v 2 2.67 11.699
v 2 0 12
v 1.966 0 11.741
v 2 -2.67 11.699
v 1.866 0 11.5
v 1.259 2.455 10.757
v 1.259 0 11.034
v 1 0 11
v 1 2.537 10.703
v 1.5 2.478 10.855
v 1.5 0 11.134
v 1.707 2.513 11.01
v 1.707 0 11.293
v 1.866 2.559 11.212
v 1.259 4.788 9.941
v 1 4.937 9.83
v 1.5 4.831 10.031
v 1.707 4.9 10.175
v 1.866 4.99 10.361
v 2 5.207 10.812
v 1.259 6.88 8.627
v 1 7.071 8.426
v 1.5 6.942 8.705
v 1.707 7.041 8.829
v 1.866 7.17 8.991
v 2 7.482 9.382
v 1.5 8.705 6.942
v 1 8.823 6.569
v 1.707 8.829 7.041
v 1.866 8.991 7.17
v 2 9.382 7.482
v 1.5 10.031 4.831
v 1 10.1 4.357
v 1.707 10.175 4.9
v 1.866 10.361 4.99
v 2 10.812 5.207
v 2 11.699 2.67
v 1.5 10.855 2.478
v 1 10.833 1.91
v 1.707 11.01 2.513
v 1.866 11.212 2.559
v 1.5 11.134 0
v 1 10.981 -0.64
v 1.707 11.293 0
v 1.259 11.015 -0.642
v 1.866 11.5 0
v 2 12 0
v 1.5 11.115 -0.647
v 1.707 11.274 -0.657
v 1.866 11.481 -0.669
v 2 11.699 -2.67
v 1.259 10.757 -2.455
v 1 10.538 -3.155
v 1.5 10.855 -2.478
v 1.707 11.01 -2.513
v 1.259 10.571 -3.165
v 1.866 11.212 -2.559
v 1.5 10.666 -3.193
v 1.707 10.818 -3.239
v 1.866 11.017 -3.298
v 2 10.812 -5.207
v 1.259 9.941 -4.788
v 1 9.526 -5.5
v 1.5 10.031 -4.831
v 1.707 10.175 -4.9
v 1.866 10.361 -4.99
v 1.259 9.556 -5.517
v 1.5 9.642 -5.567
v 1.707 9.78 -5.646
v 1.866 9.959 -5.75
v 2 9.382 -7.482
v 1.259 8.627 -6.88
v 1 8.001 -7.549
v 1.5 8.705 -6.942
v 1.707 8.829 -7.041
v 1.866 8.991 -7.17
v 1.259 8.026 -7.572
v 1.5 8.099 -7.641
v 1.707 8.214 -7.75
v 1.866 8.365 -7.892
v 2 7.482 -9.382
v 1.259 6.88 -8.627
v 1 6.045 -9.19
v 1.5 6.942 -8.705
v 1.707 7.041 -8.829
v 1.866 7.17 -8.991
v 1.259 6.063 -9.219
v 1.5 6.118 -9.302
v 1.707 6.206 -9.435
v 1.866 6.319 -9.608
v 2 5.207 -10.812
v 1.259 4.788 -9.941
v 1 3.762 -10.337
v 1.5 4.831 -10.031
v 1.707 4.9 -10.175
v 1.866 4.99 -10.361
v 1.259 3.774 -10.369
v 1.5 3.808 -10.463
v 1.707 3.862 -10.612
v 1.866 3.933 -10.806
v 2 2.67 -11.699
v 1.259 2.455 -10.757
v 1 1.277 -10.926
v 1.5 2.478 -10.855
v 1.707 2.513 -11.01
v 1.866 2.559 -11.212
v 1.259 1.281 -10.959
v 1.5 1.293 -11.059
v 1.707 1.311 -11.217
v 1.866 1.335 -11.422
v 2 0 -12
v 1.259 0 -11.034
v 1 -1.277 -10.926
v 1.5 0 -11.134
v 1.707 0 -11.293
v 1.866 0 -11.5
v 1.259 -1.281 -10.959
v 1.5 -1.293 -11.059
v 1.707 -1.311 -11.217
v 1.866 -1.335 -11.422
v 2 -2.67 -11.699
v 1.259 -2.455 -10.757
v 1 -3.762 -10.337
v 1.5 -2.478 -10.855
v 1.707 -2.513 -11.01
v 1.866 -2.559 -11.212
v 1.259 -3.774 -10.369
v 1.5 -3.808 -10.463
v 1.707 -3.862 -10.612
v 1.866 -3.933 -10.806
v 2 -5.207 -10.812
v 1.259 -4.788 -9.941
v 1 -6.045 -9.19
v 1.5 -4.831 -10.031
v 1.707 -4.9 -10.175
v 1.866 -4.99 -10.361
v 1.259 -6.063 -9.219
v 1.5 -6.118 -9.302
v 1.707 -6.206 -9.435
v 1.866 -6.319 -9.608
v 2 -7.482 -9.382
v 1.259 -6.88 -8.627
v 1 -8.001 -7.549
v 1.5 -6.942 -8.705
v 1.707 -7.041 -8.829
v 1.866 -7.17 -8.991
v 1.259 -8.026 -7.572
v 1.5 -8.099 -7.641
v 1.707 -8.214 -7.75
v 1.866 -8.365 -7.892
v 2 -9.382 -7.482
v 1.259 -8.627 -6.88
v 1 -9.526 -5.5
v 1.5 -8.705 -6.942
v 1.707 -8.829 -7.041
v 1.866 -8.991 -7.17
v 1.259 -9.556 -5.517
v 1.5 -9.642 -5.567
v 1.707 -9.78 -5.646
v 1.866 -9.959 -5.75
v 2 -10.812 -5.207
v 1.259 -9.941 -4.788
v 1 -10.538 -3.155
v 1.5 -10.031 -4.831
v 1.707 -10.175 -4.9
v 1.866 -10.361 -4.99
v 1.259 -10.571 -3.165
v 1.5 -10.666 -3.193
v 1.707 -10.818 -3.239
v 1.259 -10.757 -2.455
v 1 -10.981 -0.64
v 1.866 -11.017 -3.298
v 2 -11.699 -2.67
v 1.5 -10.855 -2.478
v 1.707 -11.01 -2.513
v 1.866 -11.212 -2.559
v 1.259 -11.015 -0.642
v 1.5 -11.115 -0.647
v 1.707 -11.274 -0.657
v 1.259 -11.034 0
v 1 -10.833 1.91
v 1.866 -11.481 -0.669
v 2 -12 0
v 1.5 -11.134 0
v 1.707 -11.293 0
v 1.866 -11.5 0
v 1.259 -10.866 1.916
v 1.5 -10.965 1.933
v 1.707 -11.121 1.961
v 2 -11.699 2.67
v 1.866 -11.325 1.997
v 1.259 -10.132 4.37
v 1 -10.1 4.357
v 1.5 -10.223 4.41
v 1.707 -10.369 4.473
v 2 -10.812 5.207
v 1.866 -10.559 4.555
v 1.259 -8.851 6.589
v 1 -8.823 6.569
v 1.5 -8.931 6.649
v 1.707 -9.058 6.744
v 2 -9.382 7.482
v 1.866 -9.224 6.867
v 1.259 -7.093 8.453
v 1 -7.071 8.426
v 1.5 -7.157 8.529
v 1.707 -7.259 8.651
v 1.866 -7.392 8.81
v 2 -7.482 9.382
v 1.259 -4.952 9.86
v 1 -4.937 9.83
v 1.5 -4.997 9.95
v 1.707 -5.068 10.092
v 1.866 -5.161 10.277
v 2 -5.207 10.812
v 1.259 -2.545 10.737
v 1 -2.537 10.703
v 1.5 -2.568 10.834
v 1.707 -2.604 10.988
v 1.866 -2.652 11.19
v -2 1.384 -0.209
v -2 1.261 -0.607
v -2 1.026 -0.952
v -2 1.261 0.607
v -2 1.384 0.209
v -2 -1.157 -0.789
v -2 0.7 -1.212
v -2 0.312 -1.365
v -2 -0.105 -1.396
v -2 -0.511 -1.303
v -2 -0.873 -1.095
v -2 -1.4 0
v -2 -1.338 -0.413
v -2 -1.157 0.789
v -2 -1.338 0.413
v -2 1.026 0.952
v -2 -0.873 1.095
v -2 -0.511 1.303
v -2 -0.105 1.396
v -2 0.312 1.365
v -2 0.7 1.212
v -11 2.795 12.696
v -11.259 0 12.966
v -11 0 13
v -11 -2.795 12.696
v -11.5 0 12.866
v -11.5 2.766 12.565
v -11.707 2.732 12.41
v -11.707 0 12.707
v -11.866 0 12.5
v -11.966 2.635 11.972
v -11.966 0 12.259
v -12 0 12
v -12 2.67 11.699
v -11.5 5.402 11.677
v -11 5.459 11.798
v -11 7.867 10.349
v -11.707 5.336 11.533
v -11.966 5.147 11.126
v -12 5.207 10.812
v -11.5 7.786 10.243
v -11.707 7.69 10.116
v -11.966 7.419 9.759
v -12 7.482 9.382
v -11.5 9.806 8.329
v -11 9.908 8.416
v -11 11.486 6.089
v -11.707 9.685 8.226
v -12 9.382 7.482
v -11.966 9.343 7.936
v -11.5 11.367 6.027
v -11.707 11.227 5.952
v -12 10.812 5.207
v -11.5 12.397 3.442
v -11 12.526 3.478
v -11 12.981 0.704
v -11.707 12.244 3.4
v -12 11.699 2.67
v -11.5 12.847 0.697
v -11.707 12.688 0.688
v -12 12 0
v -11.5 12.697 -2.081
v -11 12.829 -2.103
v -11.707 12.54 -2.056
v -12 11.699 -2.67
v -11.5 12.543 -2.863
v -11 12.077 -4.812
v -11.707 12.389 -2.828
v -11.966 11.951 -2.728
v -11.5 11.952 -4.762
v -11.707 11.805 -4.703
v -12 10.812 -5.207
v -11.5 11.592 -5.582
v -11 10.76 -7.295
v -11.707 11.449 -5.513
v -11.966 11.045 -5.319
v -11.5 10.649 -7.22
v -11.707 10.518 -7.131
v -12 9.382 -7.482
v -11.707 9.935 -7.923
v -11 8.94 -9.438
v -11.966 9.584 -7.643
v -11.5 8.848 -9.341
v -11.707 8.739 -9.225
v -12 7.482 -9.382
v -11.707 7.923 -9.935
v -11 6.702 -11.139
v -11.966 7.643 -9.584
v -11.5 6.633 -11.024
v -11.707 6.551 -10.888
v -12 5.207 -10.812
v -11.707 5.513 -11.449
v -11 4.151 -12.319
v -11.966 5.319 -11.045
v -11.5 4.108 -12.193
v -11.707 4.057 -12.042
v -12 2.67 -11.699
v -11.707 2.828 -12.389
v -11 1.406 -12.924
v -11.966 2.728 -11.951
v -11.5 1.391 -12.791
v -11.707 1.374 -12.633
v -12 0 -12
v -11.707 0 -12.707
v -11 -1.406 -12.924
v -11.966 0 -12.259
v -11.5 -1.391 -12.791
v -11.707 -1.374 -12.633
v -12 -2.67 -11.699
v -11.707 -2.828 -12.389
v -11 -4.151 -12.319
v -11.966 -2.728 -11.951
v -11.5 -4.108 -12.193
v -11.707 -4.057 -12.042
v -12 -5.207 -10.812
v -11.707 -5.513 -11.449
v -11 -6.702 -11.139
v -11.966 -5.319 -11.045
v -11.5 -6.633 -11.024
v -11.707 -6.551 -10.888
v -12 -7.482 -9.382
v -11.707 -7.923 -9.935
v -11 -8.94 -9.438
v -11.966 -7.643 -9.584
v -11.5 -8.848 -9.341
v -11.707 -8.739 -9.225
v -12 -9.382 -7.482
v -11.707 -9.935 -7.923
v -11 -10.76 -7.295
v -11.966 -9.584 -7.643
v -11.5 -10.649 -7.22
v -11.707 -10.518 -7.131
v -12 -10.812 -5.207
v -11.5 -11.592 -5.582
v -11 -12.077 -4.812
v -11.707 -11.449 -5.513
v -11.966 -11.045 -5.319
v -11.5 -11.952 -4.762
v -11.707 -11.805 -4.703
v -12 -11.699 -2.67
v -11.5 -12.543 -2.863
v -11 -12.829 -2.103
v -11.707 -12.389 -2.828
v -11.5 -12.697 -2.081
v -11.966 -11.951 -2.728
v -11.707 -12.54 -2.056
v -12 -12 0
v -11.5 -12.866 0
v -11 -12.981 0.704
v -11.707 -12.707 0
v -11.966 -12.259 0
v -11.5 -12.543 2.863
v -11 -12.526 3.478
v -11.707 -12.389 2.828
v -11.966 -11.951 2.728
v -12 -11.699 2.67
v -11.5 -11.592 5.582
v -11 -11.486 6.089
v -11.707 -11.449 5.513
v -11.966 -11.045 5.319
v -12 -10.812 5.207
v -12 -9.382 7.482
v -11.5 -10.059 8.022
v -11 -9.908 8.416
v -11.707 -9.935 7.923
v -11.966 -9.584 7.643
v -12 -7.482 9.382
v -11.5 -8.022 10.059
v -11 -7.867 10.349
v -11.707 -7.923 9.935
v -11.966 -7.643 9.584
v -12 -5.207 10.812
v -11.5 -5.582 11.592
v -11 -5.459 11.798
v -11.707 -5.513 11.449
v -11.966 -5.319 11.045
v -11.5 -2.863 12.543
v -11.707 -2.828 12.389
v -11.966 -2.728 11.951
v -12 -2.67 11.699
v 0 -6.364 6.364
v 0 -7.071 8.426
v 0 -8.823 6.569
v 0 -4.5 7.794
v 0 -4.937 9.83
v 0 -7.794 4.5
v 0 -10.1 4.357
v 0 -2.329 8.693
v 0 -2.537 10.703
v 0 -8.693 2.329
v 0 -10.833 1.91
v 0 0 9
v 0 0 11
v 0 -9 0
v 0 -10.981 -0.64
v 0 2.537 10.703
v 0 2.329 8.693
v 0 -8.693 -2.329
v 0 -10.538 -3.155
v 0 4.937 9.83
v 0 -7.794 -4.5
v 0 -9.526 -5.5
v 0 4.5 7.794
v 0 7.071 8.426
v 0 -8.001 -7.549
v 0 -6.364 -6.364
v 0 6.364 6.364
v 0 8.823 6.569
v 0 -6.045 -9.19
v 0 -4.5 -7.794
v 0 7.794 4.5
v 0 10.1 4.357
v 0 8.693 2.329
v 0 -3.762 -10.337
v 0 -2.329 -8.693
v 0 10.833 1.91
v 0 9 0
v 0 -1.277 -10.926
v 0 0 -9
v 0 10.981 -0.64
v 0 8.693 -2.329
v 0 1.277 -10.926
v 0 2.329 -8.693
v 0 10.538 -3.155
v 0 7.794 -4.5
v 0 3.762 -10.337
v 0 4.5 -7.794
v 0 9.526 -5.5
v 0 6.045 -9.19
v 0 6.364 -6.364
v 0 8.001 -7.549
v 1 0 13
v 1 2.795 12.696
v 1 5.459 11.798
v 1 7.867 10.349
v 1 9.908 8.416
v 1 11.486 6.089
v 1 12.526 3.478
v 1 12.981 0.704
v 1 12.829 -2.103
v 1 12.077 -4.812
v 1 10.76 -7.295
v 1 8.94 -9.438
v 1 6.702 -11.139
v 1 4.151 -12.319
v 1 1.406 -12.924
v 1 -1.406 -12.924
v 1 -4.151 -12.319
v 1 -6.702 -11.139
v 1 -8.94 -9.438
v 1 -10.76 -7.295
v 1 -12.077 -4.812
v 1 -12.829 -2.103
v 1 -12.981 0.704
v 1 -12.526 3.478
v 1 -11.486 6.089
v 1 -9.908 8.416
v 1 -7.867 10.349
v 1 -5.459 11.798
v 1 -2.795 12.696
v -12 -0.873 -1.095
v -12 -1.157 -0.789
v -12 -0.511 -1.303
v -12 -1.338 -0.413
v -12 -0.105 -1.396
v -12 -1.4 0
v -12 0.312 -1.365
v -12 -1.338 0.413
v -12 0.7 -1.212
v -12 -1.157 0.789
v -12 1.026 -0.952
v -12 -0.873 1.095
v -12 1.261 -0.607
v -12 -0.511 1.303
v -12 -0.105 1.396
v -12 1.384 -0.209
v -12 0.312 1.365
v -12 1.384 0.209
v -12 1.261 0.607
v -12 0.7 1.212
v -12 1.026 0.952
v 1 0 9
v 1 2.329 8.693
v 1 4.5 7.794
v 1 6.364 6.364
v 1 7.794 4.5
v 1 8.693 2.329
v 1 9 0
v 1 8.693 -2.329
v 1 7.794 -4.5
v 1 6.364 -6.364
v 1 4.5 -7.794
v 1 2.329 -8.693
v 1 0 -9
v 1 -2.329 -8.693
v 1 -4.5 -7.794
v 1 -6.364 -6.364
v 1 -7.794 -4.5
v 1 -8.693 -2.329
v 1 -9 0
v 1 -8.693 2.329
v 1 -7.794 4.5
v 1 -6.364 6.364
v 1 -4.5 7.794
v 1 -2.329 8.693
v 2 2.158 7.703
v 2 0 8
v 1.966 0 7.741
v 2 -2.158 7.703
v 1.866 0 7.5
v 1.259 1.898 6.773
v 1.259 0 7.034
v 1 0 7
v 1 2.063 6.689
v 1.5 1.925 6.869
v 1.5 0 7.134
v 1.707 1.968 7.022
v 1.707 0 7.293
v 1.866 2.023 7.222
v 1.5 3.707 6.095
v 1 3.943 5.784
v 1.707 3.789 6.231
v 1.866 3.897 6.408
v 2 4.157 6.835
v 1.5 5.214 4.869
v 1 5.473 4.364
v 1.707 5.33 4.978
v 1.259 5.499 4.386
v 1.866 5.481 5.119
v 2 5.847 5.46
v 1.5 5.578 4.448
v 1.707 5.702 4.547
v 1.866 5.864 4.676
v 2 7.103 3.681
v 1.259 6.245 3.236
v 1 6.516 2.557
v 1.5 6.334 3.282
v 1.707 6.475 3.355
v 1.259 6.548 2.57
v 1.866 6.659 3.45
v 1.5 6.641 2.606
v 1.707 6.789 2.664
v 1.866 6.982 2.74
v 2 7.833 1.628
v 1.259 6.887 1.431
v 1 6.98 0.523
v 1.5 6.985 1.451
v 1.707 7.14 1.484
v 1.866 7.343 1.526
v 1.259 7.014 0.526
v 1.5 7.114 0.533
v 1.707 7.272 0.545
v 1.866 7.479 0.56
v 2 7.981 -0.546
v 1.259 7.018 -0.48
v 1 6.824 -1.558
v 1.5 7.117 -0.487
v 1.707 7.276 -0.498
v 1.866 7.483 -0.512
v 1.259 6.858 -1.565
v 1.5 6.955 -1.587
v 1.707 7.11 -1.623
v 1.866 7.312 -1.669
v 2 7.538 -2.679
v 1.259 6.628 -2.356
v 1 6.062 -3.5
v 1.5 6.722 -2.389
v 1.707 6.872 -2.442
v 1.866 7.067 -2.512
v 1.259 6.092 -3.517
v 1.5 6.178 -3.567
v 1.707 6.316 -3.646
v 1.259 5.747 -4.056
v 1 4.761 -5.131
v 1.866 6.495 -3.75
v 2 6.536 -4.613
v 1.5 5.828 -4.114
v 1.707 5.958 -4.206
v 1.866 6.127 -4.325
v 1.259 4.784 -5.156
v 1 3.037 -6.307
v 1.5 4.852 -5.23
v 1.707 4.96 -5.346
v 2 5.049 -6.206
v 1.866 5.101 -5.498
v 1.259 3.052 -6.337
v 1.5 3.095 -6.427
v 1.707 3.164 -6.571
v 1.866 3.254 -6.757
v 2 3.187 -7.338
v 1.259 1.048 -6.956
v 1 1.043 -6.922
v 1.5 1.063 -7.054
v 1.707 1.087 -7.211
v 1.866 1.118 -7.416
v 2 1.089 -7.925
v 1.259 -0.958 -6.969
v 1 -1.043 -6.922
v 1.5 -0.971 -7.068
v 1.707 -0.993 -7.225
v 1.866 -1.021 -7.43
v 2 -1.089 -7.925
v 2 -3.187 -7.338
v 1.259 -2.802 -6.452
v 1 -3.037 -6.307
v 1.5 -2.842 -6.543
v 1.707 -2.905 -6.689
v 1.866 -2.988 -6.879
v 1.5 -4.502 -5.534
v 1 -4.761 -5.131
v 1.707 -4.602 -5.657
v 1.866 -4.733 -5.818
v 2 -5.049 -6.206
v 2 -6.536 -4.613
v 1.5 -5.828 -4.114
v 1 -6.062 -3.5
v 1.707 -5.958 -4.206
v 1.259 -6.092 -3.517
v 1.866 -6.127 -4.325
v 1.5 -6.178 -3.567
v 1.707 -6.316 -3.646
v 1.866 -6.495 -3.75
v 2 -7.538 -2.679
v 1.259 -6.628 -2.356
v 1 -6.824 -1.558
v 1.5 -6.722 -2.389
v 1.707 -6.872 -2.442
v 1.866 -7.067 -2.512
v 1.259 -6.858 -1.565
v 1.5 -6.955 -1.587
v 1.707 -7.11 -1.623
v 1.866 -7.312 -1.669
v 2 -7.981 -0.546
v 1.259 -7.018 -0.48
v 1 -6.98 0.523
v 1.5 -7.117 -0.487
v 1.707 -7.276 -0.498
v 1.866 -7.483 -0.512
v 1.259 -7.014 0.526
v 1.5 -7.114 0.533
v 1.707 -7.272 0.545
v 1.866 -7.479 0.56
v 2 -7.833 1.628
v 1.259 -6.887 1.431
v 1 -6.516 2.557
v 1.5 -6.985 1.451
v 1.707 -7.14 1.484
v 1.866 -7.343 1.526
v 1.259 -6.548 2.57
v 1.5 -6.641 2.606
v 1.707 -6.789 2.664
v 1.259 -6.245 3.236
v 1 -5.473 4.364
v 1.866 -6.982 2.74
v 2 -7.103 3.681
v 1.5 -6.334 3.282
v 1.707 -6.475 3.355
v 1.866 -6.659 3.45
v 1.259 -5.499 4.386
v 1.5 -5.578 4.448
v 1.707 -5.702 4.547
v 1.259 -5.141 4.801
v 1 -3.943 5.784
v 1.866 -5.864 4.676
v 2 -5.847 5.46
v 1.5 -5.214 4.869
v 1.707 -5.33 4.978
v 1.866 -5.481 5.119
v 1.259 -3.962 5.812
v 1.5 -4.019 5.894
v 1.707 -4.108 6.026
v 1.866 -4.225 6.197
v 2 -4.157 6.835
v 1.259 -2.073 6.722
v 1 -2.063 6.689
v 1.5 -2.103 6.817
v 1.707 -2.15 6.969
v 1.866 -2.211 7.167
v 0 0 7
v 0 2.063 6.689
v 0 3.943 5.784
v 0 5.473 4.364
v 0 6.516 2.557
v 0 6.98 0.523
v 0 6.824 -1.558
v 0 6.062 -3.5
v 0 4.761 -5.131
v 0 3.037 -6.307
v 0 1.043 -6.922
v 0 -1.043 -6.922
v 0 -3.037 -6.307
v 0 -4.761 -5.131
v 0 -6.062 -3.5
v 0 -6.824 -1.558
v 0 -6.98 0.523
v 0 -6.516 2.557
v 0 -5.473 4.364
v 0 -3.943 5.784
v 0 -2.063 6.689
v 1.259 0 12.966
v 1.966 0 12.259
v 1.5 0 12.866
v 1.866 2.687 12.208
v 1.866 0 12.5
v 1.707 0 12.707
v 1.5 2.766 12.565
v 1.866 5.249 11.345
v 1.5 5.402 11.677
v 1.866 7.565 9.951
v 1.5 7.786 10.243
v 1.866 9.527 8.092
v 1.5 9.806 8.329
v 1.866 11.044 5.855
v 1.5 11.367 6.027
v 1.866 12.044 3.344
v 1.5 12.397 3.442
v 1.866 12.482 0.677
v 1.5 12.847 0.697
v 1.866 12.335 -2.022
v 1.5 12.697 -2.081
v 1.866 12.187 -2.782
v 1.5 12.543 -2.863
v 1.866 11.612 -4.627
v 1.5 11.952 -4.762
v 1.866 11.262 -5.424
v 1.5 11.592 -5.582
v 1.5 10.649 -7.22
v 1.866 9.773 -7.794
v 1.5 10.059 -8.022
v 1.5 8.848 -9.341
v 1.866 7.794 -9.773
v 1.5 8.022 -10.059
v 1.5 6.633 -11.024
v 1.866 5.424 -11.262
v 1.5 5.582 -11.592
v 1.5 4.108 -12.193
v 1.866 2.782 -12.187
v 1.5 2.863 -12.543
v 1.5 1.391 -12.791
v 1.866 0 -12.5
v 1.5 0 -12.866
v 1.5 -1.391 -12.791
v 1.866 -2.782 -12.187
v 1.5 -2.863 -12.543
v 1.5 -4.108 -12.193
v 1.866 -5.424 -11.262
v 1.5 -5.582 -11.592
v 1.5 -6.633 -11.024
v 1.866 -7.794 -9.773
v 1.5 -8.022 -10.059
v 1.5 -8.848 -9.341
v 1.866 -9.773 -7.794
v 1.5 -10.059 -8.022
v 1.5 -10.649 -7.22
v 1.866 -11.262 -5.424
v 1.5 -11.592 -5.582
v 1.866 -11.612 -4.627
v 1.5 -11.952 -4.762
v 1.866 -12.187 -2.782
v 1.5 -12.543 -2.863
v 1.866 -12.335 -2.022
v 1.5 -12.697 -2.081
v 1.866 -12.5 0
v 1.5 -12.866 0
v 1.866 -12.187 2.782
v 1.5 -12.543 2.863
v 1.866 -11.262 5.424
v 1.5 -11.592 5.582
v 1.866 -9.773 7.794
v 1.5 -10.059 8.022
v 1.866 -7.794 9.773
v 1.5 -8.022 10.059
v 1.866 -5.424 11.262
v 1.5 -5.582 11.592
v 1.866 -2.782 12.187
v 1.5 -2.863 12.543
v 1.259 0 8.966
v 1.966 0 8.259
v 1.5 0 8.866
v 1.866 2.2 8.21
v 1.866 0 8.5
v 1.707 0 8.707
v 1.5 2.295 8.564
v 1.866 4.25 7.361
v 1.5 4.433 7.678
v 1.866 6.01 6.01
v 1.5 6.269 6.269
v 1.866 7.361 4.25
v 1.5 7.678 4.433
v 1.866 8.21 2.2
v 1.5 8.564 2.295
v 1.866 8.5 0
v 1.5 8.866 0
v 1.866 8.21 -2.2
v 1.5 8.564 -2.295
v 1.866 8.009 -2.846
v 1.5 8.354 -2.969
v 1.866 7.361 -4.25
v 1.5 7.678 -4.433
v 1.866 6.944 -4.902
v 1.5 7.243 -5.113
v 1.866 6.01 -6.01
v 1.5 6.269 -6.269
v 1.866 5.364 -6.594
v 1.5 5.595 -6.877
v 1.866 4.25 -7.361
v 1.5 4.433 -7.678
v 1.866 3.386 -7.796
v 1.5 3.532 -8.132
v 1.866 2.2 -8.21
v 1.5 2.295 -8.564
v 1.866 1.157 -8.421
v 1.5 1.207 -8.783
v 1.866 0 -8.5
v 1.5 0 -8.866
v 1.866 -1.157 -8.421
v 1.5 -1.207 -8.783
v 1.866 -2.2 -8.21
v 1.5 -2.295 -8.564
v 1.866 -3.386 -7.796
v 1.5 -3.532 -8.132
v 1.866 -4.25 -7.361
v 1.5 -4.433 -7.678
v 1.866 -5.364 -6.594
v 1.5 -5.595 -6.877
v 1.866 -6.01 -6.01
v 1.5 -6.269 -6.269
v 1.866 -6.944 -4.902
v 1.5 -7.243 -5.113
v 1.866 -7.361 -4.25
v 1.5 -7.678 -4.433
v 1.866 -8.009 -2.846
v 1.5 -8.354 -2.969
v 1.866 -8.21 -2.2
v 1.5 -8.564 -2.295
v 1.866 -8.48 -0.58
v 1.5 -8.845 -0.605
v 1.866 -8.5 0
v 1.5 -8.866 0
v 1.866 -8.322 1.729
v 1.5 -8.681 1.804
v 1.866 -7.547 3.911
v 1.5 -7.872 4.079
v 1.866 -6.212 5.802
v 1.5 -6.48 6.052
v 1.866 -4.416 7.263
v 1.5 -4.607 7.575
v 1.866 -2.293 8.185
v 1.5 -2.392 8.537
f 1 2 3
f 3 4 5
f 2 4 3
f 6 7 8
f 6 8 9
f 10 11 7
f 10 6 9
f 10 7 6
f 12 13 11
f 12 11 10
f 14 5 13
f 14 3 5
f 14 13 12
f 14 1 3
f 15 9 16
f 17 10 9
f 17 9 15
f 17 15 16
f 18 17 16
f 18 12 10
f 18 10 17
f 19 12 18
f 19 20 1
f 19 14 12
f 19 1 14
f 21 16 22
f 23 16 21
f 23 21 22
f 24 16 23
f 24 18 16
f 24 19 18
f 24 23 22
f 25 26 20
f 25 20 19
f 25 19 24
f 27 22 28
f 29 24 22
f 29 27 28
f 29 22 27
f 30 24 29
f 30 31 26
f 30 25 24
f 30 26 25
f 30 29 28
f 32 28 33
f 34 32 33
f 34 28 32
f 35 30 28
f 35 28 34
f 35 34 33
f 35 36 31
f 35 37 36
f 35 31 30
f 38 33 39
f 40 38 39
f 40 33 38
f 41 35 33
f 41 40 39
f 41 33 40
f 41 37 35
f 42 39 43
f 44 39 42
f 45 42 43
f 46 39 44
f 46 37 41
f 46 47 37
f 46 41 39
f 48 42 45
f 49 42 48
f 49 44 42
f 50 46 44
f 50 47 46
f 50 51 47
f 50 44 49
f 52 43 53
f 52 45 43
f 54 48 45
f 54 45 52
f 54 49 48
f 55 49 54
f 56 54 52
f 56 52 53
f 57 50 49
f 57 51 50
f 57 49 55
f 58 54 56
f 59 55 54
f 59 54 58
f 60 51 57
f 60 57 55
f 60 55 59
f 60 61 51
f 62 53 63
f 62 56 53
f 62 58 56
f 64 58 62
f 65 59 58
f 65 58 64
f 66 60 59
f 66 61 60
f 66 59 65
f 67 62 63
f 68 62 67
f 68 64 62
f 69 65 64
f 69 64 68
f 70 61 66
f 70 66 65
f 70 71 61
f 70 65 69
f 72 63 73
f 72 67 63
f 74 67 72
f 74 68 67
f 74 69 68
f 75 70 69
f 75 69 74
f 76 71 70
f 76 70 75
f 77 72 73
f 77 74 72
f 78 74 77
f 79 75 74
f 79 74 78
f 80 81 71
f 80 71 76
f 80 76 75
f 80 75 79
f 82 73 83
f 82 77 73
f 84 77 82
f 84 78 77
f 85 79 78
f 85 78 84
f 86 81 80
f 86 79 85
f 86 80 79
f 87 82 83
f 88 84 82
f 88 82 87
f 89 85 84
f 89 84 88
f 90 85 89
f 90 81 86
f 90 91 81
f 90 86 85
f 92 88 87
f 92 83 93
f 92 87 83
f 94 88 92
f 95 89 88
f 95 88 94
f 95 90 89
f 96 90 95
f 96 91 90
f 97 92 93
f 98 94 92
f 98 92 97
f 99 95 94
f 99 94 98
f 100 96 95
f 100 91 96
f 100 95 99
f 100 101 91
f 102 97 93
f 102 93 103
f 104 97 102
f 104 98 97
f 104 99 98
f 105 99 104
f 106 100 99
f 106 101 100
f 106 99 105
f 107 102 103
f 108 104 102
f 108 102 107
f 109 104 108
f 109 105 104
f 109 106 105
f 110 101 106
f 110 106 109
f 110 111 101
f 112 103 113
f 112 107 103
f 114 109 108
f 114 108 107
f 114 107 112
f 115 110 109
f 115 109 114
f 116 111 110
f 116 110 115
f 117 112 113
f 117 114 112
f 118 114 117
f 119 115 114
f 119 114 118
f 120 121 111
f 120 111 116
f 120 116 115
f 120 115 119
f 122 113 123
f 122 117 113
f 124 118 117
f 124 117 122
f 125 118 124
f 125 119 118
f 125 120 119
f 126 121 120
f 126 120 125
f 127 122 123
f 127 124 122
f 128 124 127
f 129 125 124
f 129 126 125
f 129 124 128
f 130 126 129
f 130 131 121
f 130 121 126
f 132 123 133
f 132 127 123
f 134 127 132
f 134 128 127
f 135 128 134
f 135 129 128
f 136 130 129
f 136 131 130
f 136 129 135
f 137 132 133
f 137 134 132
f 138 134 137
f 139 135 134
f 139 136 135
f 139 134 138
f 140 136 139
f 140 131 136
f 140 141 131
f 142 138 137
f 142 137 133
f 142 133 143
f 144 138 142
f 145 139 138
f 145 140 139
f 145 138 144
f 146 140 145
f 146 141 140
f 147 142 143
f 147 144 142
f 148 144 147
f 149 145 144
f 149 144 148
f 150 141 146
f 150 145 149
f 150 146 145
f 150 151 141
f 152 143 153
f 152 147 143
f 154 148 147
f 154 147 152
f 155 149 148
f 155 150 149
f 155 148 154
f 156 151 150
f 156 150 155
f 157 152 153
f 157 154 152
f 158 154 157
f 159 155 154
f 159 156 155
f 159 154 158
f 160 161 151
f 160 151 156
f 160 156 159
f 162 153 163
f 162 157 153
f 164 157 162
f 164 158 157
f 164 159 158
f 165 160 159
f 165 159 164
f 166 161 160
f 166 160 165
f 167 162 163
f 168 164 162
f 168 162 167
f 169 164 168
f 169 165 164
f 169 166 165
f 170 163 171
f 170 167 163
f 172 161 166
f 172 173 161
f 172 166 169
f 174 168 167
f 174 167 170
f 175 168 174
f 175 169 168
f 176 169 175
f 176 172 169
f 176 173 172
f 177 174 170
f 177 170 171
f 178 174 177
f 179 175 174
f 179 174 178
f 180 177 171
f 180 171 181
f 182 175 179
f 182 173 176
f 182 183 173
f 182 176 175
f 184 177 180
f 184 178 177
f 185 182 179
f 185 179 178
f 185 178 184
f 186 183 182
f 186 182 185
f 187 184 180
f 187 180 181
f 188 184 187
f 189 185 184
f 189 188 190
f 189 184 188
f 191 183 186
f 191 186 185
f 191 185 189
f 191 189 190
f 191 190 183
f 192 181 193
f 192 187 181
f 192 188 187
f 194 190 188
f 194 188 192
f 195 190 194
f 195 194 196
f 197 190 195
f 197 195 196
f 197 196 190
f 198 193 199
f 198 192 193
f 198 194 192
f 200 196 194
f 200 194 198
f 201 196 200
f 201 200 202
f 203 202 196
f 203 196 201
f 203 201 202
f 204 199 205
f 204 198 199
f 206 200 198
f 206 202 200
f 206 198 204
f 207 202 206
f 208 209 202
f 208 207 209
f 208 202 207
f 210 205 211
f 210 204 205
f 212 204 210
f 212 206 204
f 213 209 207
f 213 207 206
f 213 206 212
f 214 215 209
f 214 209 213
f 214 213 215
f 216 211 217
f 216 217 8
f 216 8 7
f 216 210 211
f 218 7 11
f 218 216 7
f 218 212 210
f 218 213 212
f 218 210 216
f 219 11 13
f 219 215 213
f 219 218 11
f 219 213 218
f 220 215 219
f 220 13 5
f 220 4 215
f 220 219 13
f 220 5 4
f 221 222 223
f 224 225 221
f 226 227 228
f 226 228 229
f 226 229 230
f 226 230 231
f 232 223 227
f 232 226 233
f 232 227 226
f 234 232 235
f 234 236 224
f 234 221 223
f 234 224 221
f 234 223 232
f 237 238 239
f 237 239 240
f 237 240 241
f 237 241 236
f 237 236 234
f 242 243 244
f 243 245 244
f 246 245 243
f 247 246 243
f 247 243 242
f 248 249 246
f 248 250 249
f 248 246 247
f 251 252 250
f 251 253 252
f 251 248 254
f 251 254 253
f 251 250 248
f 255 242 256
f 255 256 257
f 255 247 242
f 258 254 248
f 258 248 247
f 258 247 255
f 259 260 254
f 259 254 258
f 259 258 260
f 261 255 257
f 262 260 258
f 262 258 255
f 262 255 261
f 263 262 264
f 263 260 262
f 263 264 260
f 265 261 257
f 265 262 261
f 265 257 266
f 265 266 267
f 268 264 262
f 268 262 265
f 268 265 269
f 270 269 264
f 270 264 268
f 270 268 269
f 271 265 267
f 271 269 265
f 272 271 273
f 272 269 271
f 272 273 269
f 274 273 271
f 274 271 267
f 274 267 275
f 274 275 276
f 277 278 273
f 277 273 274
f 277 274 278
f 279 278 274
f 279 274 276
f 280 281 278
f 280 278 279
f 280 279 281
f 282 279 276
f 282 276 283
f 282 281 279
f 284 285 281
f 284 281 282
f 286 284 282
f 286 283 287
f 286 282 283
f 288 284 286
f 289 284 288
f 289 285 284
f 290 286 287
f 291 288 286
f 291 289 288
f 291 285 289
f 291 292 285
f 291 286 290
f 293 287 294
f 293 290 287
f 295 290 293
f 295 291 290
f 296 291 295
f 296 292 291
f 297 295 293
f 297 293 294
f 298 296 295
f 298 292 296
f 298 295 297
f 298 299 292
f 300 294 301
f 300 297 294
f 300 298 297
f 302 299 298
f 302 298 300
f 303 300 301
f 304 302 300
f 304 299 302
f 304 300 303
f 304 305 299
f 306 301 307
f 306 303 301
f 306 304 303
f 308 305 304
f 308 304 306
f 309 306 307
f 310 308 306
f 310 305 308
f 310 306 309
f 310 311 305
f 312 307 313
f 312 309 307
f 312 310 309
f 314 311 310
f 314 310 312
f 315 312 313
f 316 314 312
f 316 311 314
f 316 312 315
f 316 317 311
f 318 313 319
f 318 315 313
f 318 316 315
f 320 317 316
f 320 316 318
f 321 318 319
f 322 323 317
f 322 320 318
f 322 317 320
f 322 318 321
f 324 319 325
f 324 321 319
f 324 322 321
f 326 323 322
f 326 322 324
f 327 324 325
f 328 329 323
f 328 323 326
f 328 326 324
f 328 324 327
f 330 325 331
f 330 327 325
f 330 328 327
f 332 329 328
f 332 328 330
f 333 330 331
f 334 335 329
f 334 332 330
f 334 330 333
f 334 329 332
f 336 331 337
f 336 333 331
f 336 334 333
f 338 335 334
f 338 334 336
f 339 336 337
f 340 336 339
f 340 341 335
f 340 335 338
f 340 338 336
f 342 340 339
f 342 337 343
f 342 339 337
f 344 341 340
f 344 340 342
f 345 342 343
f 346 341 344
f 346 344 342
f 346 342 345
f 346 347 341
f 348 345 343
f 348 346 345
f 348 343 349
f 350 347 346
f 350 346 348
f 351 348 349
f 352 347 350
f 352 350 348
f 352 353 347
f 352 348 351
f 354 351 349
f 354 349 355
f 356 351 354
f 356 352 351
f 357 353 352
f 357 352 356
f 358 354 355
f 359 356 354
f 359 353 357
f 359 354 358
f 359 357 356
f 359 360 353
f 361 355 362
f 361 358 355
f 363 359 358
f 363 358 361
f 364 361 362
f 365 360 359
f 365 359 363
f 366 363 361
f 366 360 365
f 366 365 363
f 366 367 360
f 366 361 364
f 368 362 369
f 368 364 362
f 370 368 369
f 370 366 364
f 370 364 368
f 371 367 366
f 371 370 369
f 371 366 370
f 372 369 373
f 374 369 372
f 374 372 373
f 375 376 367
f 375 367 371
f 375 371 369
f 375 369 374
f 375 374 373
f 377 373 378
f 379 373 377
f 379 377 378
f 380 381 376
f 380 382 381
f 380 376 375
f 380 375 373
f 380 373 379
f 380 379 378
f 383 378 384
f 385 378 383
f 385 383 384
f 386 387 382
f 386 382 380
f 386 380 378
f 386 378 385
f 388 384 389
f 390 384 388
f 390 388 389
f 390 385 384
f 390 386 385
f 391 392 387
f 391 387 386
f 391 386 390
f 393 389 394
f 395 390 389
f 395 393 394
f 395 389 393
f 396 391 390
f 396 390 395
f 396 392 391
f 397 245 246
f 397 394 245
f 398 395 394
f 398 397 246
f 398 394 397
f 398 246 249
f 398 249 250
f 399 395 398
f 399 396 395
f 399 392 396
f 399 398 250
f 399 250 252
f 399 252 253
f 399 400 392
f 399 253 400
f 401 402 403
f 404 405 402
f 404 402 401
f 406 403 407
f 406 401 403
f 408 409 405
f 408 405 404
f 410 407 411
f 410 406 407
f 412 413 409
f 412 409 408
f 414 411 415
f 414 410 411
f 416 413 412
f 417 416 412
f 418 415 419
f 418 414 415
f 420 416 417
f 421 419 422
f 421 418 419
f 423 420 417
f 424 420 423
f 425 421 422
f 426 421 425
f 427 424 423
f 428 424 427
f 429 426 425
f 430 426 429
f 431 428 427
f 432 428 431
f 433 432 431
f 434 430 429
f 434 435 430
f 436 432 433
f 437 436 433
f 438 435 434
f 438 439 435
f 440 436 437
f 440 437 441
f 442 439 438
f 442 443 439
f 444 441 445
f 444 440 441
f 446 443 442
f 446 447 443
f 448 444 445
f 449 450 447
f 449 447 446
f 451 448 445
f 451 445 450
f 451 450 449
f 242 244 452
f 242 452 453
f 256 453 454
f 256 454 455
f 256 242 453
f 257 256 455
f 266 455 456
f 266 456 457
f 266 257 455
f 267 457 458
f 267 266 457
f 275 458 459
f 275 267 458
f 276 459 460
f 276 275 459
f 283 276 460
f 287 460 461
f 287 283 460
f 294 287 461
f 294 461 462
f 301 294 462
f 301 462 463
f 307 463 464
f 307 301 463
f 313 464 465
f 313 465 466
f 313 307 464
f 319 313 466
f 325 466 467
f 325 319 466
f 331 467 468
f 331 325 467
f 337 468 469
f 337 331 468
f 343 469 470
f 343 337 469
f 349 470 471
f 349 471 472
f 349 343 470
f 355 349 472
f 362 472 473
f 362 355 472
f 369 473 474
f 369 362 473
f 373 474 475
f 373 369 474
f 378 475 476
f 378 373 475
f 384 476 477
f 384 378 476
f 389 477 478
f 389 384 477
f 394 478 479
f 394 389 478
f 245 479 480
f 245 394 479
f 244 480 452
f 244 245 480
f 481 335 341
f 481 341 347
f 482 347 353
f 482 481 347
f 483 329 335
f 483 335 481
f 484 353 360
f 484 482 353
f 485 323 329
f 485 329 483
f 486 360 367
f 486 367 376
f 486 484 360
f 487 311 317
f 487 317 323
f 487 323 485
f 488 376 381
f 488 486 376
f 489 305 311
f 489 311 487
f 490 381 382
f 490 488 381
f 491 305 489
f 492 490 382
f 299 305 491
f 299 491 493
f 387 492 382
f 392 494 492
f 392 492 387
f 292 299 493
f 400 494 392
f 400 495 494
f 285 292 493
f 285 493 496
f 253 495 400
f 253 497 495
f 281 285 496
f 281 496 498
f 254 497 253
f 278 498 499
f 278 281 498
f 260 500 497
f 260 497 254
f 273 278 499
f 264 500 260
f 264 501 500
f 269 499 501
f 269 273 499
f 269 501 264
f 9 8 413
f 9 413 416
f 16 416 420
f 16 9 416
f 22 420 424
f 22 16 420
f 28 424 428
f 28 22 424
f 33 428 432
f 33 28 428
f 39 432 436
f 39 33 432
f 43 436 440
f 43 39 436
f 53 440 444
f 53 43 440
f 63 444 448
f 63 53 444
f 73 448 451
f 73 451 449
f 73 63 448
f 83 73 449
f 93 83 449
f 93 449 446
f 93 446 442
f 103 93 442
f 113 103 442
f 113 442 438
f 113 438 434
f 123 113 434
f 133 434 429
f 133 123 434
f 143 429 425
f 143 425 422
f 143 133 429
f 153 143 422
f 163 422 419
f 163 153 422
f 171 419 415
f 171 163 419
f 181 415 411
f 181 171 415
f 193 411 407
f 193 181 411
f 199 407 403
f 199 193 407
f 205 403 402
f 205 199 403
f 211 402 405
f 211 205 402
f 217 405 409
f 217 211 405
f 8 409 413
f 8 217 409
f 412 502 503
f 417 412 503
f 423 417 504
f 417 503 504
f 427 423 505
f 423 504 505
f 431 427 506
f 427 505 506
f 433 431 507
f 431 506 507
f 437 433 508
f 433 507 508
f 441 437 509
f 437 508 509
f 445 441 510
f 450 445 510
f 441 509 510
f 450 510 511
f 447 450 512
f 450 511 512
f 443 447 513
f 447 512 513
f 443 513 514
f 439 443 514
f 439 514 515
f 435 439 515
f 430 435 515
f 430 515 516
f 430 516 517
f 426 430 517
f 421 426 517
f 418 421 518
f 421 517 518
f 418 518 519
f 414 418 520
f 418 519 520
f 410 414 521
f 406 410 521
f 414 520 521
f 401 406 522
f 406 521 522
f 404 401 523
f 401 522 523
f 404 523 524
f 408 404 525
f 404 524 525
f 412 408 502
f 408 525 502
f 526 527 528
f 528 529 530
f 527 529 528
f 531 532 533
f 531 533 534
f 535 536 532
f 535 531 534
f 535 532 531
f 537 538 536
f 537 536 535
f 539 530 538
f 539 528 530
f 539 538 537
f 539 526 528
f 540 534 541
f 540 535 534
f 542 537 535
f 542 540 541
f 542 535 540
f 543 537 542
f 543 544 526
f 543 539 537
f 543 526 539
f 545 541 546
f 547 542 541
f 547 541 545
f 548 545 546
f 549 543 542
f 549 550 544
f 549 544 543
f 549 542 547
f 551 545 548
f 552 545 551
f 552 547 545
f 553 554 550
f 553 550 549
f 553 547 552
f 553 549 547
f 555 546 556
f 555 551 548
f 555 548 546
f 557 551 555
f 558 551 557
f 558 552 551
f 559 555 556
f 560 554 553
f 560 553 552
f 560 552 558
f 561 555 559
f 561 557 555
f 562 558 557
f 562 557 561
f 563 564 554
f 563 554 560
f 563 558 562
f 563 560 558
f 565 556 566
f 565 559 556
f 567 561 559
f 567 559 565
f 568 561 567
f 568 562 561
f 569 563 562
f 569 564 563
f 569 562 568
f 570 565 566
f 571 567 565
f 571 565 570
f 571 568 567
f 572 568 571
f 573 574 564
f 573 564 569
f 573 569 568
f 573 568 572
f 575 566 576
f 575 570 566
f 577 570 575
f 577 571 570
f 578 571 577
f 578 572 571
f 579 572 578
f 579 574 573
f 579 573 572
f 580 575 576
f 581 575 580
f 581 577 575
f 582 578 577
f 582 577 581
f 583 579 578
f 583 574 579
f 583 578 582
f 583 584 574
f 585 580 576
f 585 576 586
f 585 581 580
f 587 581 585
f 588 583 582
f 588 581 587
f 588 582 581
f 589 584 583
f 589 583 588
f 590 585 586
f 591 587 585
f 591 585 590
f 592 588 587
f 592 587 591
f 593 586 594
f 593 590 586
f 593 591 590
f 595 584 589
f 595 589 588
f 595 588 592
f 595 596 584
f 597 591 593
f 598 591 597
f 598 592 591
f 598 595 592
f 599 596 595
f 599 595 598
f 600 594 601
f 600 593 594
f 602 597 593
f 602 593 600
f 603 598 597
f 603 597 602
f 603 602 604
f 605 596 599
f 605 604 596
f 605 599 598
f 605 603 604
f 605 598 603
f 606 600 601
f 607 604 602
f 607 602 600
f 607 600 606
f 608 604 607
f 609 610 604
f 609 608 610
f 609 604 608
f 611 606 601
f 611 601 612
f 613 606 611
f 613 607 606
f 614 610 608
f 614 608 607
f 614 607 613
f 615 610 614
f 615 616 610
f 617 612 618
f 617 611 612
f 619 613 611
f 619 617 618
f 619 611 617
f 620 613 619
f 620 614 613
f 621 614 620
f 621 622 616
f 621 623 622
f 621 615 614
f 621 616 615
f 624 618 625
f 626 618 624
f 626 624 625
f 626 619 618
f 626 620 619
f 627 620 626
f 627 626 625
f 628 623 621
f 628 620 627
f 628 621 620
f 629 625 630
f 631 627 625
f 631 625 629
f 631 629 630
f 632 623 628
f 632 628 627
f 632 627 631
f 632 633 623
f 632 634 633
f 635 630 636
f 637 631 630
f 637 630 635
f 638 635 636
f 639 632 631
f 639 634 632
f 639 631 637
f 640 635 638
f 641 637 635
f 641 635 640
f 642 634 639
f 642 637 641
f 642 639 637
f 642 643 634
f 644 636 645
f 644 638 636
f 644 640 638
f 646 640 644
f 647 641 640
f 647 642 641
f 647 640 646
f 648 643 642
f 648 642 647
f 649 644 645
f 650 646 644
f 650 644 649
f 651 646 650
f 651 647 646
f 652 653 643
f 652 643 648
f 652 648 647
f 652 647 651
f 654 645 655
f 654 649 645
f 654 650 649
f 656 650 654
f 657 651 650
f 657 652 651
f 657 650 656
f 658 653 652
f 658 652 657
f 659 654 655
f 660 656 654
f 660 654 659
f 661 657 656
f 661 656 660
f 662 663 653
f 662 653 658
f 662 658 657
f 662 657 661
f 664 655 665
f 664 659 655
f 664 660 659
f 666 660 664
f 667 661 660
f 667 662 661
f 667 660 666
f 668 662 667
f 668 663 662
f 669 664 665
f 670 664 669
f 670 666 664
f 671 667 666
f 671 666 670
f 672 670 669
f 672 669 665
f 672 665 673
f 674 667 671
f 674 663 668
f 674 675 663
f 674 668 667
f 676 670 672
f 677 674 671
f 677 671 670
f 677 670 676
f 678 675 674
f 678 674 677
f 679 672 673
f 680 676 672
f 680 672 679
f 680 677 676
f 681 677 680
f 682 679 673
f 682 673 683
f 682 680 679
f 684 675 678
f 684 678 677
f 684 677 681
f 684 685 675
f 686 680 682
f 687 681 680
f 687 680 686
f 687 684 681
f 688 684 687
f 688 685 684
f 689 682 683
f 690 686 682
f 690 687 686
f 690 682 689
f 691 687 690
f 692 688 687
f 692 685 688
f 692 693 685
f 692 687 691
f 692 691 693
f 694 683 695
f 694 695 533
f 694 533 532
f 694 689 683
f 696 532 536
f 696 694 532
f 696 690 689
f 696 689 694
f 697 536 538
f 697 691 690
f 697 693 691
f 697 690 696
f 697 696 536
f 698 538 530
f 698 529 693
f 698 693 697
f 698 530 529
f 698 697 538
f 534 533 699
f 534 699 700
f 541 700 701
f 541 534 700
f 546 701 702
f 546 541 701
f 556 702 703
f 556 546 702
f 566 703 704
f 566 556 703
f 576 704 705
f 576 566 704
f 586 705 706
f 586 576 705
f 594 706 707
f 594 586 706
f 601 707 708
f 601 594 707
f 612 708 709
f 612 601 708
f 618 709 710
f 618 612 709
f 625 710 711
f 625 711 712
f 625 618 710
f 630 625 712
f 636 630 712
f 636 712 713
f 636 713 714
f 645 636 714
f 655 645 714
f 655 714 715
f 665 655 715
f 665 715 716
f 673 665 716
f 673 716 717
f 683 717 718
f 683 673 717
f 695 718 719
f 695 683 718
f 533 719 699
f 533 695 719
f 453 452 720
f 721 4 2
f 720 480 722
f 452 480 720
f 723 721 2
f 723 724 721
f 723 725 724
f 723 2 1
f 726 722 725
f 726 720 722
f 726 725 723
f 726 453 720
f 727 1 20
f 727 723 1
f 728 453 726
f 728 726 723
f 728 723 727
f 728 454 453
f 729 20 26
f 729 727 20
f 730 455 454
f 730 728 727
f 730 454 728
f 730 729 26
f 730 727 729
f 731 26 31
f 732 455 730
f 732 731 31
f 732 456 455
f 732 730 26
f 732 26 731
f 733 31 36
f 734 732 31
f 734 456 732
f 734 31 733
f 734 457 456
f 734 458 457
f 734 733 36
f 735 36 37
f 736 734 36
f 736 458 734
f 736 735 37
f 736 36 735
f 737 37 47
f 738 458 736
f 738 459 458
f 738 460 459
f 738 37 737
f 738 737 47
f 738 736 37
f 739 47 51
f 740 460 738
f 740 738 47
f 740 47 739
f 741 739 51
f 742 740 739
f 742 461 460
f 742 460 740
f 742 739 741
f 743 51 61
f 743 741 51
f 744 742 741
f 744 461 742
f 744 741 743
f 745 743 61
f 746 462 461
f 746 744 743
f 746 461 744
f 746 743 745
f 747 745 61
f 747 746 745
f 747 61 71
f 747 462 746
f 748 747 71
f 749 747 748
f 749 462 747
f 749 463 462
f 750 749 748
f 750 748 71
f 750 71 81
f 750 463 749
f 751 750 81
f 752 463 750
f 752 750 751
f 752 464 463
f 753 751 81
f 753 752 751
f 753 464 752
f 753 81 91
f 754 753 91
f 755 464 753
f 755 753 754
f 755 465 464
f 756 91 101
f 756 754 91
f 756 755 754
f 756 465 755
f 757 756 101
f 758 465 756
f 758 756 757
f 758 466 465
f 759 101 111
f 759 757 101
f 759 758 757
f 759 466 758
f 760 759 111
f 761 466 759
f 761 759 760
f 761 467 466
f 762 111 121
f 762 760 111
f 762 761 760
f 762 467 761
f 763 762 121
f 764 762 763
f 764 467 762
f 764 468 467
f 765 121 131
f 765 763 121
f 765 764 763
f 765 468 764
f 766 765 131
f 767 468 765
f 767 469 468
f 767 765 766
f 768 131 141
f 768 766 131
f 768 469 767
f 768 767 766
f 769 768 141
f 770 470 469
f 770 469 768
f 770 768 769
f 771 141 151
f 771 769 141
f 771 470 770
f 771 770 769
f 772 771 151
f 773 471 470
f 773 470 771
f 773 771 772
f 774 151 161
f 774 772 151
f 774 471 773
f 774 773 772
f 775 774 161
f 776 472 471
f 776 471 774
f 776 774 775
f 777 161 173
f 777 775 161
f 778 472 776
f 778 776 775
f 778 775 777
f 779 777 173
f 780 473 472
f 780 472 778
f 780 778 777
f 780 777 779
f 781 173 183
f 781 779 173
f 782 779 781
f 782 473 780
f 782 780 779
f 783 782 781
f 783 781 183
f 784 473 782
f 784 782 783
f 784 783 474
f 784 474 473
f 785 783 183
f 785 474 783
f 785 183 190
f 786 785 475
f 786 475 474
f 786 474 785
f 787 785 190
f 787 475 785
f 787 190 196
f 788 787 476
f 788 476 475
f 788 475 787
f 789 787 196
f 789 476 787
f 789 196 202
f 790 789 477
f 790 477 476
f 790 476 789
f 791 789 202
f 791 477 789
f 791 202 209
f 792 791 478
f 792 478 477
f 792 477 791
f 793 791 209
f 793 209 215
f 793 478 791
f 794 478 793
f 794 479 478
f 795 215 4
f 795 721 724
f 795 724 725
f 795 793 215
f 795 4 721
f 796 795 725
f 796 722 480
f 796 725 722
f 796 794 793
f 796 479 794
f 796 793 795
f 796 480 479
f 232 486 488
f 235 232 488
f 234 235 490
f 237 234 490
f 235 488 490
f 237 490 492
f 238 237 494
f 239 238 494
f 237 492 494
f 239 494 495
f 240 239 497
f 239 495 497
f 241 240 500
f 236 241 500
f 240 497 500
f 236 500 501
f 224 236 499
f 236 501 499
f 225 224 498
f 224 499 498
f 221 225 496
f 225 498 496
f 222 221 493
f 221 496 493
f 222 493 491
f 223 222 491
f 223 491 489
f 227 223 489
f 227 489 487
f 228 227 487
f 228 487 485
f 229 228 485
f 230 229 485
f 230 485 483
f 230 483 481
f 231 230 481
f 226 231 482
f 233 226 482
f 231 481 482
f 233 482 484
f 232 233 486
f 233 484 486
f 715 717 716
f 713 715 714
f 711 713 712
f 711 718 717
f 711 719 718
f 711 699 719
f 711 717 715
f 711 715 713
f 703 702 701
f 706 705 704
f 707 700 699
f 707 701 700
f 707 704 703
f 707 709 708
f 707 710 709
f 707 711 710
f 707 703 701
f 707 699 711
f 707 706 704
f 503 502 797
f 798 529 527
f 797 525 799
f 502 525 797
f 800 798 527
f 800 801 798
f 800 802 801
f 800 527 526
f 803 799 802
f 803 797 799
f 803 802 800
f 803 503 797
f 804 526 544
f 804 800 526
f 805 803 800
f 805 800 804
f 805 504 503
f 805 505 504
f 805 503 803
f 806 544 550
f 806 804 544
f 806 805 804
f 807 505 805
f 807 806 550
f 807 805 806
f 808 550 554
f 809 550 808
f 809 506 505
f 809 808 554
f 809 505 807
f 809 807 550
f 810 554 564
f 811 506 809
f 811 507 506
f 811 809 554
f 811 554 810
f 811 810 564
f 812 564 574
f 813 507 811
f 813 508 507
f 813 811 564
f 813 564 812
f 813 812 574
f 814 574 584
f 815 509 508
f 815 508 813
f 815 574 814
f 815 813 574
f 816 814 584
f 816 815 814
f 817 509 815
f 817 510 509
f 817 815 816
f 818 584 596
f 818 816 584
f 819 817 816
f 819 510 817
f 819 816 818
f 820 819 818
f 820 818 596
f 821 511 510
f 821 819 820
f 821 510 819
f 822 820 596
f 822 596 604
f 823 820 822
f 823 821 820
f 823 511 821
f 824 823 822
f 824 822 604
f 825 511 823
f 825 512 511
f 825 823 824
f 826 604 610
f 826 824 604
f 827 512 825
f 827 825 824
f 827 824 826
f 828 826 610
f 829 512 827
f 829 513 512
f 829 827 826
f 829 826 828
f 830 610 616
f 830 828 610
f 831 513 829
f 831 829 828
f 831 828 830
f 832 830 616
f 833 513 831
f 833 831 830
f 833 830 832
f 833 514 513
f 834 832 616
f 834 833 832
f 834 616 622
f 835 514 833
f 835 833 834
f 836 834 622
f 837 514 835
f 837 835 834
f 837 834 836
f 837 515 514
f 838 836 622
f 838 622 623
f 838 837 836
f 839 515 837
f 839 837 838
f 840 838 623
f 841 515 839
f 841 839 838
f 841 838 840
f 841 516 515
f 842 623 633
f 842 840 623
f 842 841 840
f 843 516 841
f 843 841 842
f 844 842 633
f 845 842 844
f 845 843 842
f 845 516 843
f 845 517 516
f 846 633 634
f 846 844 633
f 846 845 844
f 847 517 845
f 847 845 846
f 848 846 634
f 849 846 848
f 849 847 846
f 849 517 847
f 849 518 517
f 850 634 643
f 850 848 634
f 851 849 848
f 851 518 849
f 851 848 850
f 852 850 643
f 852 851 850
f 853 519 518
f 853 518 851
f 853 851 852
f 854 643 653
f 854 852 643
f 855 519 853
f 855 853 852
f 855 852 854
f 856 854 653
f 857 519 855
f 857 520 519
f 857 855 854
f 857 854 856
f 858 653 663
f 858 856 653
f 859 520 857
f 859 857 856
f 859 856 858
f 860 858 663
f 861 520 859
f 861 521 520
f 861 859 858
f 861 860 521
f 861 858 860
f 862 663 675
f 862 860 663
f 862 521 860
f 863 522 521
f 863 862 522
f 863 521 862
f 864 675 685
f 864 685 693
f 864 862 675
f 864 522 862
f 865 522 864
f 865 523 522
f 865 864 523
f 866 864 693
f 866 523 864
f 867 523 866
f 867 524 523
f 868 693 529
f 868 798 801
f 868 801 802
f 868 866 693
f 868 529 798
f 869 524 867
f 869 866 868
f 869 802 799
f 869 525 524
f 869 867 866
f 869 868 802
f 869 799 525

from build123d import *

# Parameters (mm, degrees)
F0_W     = 2
F0_H     = 2
F0_W_2   = 12
F2_R     = 0.99999
F3_R     = 1.4
F4_DEPTH = 10


# Not quite as in the source:
# - a fillet or chamfer is up to 0.001 mm smaller than in the source, because OpenCascade refuses the exact size


with BuildPart() as f1:
    # F0 (on Front) → F1 (revolve)
    with BuildSketch(Plane.XZ):
        Polygon((-12, 0), (0, 0), (0, 7), (0, 9), (0, 11), (-12, 11), align=None)
        with Locations((1, 8)):
            Rectangle(F0_W, F0_H)
        with Locations((-6, 12)):
            Rectangle(F0_W_2, F0_H)
        with Locations((1, 12)):
            Rectangle(F0_W, F0_H)
    revolve(axis=Axis((-6, 0, 0), (-1, 0, 0)))

    # F2 (radius 1 in the source; OpenCascade refuses exactly that, so slightly less here)
    f2_edges = [f1.edges().sort_by_distance(p)[0] for p in [
        (2, 0, -13),
        (2, 0, -9),
        (2, 0, -7),
        (2, 0, -11),
        (-12, 0, -13),
    ]]
    fillet(f2_edges, radius=F2_R)

    # F3 (on face) → F4 (cut)
    with BuildSketch(Plane(origin=(-12, 0, 0), x_dir=(0, -1, 0), z_dir=(-1, 0, 0))):
        Circle(F3_R)
    extrude(amount=-F4_DEPTH, mode=Mode.SUBTRACT)


solid = f1.part
